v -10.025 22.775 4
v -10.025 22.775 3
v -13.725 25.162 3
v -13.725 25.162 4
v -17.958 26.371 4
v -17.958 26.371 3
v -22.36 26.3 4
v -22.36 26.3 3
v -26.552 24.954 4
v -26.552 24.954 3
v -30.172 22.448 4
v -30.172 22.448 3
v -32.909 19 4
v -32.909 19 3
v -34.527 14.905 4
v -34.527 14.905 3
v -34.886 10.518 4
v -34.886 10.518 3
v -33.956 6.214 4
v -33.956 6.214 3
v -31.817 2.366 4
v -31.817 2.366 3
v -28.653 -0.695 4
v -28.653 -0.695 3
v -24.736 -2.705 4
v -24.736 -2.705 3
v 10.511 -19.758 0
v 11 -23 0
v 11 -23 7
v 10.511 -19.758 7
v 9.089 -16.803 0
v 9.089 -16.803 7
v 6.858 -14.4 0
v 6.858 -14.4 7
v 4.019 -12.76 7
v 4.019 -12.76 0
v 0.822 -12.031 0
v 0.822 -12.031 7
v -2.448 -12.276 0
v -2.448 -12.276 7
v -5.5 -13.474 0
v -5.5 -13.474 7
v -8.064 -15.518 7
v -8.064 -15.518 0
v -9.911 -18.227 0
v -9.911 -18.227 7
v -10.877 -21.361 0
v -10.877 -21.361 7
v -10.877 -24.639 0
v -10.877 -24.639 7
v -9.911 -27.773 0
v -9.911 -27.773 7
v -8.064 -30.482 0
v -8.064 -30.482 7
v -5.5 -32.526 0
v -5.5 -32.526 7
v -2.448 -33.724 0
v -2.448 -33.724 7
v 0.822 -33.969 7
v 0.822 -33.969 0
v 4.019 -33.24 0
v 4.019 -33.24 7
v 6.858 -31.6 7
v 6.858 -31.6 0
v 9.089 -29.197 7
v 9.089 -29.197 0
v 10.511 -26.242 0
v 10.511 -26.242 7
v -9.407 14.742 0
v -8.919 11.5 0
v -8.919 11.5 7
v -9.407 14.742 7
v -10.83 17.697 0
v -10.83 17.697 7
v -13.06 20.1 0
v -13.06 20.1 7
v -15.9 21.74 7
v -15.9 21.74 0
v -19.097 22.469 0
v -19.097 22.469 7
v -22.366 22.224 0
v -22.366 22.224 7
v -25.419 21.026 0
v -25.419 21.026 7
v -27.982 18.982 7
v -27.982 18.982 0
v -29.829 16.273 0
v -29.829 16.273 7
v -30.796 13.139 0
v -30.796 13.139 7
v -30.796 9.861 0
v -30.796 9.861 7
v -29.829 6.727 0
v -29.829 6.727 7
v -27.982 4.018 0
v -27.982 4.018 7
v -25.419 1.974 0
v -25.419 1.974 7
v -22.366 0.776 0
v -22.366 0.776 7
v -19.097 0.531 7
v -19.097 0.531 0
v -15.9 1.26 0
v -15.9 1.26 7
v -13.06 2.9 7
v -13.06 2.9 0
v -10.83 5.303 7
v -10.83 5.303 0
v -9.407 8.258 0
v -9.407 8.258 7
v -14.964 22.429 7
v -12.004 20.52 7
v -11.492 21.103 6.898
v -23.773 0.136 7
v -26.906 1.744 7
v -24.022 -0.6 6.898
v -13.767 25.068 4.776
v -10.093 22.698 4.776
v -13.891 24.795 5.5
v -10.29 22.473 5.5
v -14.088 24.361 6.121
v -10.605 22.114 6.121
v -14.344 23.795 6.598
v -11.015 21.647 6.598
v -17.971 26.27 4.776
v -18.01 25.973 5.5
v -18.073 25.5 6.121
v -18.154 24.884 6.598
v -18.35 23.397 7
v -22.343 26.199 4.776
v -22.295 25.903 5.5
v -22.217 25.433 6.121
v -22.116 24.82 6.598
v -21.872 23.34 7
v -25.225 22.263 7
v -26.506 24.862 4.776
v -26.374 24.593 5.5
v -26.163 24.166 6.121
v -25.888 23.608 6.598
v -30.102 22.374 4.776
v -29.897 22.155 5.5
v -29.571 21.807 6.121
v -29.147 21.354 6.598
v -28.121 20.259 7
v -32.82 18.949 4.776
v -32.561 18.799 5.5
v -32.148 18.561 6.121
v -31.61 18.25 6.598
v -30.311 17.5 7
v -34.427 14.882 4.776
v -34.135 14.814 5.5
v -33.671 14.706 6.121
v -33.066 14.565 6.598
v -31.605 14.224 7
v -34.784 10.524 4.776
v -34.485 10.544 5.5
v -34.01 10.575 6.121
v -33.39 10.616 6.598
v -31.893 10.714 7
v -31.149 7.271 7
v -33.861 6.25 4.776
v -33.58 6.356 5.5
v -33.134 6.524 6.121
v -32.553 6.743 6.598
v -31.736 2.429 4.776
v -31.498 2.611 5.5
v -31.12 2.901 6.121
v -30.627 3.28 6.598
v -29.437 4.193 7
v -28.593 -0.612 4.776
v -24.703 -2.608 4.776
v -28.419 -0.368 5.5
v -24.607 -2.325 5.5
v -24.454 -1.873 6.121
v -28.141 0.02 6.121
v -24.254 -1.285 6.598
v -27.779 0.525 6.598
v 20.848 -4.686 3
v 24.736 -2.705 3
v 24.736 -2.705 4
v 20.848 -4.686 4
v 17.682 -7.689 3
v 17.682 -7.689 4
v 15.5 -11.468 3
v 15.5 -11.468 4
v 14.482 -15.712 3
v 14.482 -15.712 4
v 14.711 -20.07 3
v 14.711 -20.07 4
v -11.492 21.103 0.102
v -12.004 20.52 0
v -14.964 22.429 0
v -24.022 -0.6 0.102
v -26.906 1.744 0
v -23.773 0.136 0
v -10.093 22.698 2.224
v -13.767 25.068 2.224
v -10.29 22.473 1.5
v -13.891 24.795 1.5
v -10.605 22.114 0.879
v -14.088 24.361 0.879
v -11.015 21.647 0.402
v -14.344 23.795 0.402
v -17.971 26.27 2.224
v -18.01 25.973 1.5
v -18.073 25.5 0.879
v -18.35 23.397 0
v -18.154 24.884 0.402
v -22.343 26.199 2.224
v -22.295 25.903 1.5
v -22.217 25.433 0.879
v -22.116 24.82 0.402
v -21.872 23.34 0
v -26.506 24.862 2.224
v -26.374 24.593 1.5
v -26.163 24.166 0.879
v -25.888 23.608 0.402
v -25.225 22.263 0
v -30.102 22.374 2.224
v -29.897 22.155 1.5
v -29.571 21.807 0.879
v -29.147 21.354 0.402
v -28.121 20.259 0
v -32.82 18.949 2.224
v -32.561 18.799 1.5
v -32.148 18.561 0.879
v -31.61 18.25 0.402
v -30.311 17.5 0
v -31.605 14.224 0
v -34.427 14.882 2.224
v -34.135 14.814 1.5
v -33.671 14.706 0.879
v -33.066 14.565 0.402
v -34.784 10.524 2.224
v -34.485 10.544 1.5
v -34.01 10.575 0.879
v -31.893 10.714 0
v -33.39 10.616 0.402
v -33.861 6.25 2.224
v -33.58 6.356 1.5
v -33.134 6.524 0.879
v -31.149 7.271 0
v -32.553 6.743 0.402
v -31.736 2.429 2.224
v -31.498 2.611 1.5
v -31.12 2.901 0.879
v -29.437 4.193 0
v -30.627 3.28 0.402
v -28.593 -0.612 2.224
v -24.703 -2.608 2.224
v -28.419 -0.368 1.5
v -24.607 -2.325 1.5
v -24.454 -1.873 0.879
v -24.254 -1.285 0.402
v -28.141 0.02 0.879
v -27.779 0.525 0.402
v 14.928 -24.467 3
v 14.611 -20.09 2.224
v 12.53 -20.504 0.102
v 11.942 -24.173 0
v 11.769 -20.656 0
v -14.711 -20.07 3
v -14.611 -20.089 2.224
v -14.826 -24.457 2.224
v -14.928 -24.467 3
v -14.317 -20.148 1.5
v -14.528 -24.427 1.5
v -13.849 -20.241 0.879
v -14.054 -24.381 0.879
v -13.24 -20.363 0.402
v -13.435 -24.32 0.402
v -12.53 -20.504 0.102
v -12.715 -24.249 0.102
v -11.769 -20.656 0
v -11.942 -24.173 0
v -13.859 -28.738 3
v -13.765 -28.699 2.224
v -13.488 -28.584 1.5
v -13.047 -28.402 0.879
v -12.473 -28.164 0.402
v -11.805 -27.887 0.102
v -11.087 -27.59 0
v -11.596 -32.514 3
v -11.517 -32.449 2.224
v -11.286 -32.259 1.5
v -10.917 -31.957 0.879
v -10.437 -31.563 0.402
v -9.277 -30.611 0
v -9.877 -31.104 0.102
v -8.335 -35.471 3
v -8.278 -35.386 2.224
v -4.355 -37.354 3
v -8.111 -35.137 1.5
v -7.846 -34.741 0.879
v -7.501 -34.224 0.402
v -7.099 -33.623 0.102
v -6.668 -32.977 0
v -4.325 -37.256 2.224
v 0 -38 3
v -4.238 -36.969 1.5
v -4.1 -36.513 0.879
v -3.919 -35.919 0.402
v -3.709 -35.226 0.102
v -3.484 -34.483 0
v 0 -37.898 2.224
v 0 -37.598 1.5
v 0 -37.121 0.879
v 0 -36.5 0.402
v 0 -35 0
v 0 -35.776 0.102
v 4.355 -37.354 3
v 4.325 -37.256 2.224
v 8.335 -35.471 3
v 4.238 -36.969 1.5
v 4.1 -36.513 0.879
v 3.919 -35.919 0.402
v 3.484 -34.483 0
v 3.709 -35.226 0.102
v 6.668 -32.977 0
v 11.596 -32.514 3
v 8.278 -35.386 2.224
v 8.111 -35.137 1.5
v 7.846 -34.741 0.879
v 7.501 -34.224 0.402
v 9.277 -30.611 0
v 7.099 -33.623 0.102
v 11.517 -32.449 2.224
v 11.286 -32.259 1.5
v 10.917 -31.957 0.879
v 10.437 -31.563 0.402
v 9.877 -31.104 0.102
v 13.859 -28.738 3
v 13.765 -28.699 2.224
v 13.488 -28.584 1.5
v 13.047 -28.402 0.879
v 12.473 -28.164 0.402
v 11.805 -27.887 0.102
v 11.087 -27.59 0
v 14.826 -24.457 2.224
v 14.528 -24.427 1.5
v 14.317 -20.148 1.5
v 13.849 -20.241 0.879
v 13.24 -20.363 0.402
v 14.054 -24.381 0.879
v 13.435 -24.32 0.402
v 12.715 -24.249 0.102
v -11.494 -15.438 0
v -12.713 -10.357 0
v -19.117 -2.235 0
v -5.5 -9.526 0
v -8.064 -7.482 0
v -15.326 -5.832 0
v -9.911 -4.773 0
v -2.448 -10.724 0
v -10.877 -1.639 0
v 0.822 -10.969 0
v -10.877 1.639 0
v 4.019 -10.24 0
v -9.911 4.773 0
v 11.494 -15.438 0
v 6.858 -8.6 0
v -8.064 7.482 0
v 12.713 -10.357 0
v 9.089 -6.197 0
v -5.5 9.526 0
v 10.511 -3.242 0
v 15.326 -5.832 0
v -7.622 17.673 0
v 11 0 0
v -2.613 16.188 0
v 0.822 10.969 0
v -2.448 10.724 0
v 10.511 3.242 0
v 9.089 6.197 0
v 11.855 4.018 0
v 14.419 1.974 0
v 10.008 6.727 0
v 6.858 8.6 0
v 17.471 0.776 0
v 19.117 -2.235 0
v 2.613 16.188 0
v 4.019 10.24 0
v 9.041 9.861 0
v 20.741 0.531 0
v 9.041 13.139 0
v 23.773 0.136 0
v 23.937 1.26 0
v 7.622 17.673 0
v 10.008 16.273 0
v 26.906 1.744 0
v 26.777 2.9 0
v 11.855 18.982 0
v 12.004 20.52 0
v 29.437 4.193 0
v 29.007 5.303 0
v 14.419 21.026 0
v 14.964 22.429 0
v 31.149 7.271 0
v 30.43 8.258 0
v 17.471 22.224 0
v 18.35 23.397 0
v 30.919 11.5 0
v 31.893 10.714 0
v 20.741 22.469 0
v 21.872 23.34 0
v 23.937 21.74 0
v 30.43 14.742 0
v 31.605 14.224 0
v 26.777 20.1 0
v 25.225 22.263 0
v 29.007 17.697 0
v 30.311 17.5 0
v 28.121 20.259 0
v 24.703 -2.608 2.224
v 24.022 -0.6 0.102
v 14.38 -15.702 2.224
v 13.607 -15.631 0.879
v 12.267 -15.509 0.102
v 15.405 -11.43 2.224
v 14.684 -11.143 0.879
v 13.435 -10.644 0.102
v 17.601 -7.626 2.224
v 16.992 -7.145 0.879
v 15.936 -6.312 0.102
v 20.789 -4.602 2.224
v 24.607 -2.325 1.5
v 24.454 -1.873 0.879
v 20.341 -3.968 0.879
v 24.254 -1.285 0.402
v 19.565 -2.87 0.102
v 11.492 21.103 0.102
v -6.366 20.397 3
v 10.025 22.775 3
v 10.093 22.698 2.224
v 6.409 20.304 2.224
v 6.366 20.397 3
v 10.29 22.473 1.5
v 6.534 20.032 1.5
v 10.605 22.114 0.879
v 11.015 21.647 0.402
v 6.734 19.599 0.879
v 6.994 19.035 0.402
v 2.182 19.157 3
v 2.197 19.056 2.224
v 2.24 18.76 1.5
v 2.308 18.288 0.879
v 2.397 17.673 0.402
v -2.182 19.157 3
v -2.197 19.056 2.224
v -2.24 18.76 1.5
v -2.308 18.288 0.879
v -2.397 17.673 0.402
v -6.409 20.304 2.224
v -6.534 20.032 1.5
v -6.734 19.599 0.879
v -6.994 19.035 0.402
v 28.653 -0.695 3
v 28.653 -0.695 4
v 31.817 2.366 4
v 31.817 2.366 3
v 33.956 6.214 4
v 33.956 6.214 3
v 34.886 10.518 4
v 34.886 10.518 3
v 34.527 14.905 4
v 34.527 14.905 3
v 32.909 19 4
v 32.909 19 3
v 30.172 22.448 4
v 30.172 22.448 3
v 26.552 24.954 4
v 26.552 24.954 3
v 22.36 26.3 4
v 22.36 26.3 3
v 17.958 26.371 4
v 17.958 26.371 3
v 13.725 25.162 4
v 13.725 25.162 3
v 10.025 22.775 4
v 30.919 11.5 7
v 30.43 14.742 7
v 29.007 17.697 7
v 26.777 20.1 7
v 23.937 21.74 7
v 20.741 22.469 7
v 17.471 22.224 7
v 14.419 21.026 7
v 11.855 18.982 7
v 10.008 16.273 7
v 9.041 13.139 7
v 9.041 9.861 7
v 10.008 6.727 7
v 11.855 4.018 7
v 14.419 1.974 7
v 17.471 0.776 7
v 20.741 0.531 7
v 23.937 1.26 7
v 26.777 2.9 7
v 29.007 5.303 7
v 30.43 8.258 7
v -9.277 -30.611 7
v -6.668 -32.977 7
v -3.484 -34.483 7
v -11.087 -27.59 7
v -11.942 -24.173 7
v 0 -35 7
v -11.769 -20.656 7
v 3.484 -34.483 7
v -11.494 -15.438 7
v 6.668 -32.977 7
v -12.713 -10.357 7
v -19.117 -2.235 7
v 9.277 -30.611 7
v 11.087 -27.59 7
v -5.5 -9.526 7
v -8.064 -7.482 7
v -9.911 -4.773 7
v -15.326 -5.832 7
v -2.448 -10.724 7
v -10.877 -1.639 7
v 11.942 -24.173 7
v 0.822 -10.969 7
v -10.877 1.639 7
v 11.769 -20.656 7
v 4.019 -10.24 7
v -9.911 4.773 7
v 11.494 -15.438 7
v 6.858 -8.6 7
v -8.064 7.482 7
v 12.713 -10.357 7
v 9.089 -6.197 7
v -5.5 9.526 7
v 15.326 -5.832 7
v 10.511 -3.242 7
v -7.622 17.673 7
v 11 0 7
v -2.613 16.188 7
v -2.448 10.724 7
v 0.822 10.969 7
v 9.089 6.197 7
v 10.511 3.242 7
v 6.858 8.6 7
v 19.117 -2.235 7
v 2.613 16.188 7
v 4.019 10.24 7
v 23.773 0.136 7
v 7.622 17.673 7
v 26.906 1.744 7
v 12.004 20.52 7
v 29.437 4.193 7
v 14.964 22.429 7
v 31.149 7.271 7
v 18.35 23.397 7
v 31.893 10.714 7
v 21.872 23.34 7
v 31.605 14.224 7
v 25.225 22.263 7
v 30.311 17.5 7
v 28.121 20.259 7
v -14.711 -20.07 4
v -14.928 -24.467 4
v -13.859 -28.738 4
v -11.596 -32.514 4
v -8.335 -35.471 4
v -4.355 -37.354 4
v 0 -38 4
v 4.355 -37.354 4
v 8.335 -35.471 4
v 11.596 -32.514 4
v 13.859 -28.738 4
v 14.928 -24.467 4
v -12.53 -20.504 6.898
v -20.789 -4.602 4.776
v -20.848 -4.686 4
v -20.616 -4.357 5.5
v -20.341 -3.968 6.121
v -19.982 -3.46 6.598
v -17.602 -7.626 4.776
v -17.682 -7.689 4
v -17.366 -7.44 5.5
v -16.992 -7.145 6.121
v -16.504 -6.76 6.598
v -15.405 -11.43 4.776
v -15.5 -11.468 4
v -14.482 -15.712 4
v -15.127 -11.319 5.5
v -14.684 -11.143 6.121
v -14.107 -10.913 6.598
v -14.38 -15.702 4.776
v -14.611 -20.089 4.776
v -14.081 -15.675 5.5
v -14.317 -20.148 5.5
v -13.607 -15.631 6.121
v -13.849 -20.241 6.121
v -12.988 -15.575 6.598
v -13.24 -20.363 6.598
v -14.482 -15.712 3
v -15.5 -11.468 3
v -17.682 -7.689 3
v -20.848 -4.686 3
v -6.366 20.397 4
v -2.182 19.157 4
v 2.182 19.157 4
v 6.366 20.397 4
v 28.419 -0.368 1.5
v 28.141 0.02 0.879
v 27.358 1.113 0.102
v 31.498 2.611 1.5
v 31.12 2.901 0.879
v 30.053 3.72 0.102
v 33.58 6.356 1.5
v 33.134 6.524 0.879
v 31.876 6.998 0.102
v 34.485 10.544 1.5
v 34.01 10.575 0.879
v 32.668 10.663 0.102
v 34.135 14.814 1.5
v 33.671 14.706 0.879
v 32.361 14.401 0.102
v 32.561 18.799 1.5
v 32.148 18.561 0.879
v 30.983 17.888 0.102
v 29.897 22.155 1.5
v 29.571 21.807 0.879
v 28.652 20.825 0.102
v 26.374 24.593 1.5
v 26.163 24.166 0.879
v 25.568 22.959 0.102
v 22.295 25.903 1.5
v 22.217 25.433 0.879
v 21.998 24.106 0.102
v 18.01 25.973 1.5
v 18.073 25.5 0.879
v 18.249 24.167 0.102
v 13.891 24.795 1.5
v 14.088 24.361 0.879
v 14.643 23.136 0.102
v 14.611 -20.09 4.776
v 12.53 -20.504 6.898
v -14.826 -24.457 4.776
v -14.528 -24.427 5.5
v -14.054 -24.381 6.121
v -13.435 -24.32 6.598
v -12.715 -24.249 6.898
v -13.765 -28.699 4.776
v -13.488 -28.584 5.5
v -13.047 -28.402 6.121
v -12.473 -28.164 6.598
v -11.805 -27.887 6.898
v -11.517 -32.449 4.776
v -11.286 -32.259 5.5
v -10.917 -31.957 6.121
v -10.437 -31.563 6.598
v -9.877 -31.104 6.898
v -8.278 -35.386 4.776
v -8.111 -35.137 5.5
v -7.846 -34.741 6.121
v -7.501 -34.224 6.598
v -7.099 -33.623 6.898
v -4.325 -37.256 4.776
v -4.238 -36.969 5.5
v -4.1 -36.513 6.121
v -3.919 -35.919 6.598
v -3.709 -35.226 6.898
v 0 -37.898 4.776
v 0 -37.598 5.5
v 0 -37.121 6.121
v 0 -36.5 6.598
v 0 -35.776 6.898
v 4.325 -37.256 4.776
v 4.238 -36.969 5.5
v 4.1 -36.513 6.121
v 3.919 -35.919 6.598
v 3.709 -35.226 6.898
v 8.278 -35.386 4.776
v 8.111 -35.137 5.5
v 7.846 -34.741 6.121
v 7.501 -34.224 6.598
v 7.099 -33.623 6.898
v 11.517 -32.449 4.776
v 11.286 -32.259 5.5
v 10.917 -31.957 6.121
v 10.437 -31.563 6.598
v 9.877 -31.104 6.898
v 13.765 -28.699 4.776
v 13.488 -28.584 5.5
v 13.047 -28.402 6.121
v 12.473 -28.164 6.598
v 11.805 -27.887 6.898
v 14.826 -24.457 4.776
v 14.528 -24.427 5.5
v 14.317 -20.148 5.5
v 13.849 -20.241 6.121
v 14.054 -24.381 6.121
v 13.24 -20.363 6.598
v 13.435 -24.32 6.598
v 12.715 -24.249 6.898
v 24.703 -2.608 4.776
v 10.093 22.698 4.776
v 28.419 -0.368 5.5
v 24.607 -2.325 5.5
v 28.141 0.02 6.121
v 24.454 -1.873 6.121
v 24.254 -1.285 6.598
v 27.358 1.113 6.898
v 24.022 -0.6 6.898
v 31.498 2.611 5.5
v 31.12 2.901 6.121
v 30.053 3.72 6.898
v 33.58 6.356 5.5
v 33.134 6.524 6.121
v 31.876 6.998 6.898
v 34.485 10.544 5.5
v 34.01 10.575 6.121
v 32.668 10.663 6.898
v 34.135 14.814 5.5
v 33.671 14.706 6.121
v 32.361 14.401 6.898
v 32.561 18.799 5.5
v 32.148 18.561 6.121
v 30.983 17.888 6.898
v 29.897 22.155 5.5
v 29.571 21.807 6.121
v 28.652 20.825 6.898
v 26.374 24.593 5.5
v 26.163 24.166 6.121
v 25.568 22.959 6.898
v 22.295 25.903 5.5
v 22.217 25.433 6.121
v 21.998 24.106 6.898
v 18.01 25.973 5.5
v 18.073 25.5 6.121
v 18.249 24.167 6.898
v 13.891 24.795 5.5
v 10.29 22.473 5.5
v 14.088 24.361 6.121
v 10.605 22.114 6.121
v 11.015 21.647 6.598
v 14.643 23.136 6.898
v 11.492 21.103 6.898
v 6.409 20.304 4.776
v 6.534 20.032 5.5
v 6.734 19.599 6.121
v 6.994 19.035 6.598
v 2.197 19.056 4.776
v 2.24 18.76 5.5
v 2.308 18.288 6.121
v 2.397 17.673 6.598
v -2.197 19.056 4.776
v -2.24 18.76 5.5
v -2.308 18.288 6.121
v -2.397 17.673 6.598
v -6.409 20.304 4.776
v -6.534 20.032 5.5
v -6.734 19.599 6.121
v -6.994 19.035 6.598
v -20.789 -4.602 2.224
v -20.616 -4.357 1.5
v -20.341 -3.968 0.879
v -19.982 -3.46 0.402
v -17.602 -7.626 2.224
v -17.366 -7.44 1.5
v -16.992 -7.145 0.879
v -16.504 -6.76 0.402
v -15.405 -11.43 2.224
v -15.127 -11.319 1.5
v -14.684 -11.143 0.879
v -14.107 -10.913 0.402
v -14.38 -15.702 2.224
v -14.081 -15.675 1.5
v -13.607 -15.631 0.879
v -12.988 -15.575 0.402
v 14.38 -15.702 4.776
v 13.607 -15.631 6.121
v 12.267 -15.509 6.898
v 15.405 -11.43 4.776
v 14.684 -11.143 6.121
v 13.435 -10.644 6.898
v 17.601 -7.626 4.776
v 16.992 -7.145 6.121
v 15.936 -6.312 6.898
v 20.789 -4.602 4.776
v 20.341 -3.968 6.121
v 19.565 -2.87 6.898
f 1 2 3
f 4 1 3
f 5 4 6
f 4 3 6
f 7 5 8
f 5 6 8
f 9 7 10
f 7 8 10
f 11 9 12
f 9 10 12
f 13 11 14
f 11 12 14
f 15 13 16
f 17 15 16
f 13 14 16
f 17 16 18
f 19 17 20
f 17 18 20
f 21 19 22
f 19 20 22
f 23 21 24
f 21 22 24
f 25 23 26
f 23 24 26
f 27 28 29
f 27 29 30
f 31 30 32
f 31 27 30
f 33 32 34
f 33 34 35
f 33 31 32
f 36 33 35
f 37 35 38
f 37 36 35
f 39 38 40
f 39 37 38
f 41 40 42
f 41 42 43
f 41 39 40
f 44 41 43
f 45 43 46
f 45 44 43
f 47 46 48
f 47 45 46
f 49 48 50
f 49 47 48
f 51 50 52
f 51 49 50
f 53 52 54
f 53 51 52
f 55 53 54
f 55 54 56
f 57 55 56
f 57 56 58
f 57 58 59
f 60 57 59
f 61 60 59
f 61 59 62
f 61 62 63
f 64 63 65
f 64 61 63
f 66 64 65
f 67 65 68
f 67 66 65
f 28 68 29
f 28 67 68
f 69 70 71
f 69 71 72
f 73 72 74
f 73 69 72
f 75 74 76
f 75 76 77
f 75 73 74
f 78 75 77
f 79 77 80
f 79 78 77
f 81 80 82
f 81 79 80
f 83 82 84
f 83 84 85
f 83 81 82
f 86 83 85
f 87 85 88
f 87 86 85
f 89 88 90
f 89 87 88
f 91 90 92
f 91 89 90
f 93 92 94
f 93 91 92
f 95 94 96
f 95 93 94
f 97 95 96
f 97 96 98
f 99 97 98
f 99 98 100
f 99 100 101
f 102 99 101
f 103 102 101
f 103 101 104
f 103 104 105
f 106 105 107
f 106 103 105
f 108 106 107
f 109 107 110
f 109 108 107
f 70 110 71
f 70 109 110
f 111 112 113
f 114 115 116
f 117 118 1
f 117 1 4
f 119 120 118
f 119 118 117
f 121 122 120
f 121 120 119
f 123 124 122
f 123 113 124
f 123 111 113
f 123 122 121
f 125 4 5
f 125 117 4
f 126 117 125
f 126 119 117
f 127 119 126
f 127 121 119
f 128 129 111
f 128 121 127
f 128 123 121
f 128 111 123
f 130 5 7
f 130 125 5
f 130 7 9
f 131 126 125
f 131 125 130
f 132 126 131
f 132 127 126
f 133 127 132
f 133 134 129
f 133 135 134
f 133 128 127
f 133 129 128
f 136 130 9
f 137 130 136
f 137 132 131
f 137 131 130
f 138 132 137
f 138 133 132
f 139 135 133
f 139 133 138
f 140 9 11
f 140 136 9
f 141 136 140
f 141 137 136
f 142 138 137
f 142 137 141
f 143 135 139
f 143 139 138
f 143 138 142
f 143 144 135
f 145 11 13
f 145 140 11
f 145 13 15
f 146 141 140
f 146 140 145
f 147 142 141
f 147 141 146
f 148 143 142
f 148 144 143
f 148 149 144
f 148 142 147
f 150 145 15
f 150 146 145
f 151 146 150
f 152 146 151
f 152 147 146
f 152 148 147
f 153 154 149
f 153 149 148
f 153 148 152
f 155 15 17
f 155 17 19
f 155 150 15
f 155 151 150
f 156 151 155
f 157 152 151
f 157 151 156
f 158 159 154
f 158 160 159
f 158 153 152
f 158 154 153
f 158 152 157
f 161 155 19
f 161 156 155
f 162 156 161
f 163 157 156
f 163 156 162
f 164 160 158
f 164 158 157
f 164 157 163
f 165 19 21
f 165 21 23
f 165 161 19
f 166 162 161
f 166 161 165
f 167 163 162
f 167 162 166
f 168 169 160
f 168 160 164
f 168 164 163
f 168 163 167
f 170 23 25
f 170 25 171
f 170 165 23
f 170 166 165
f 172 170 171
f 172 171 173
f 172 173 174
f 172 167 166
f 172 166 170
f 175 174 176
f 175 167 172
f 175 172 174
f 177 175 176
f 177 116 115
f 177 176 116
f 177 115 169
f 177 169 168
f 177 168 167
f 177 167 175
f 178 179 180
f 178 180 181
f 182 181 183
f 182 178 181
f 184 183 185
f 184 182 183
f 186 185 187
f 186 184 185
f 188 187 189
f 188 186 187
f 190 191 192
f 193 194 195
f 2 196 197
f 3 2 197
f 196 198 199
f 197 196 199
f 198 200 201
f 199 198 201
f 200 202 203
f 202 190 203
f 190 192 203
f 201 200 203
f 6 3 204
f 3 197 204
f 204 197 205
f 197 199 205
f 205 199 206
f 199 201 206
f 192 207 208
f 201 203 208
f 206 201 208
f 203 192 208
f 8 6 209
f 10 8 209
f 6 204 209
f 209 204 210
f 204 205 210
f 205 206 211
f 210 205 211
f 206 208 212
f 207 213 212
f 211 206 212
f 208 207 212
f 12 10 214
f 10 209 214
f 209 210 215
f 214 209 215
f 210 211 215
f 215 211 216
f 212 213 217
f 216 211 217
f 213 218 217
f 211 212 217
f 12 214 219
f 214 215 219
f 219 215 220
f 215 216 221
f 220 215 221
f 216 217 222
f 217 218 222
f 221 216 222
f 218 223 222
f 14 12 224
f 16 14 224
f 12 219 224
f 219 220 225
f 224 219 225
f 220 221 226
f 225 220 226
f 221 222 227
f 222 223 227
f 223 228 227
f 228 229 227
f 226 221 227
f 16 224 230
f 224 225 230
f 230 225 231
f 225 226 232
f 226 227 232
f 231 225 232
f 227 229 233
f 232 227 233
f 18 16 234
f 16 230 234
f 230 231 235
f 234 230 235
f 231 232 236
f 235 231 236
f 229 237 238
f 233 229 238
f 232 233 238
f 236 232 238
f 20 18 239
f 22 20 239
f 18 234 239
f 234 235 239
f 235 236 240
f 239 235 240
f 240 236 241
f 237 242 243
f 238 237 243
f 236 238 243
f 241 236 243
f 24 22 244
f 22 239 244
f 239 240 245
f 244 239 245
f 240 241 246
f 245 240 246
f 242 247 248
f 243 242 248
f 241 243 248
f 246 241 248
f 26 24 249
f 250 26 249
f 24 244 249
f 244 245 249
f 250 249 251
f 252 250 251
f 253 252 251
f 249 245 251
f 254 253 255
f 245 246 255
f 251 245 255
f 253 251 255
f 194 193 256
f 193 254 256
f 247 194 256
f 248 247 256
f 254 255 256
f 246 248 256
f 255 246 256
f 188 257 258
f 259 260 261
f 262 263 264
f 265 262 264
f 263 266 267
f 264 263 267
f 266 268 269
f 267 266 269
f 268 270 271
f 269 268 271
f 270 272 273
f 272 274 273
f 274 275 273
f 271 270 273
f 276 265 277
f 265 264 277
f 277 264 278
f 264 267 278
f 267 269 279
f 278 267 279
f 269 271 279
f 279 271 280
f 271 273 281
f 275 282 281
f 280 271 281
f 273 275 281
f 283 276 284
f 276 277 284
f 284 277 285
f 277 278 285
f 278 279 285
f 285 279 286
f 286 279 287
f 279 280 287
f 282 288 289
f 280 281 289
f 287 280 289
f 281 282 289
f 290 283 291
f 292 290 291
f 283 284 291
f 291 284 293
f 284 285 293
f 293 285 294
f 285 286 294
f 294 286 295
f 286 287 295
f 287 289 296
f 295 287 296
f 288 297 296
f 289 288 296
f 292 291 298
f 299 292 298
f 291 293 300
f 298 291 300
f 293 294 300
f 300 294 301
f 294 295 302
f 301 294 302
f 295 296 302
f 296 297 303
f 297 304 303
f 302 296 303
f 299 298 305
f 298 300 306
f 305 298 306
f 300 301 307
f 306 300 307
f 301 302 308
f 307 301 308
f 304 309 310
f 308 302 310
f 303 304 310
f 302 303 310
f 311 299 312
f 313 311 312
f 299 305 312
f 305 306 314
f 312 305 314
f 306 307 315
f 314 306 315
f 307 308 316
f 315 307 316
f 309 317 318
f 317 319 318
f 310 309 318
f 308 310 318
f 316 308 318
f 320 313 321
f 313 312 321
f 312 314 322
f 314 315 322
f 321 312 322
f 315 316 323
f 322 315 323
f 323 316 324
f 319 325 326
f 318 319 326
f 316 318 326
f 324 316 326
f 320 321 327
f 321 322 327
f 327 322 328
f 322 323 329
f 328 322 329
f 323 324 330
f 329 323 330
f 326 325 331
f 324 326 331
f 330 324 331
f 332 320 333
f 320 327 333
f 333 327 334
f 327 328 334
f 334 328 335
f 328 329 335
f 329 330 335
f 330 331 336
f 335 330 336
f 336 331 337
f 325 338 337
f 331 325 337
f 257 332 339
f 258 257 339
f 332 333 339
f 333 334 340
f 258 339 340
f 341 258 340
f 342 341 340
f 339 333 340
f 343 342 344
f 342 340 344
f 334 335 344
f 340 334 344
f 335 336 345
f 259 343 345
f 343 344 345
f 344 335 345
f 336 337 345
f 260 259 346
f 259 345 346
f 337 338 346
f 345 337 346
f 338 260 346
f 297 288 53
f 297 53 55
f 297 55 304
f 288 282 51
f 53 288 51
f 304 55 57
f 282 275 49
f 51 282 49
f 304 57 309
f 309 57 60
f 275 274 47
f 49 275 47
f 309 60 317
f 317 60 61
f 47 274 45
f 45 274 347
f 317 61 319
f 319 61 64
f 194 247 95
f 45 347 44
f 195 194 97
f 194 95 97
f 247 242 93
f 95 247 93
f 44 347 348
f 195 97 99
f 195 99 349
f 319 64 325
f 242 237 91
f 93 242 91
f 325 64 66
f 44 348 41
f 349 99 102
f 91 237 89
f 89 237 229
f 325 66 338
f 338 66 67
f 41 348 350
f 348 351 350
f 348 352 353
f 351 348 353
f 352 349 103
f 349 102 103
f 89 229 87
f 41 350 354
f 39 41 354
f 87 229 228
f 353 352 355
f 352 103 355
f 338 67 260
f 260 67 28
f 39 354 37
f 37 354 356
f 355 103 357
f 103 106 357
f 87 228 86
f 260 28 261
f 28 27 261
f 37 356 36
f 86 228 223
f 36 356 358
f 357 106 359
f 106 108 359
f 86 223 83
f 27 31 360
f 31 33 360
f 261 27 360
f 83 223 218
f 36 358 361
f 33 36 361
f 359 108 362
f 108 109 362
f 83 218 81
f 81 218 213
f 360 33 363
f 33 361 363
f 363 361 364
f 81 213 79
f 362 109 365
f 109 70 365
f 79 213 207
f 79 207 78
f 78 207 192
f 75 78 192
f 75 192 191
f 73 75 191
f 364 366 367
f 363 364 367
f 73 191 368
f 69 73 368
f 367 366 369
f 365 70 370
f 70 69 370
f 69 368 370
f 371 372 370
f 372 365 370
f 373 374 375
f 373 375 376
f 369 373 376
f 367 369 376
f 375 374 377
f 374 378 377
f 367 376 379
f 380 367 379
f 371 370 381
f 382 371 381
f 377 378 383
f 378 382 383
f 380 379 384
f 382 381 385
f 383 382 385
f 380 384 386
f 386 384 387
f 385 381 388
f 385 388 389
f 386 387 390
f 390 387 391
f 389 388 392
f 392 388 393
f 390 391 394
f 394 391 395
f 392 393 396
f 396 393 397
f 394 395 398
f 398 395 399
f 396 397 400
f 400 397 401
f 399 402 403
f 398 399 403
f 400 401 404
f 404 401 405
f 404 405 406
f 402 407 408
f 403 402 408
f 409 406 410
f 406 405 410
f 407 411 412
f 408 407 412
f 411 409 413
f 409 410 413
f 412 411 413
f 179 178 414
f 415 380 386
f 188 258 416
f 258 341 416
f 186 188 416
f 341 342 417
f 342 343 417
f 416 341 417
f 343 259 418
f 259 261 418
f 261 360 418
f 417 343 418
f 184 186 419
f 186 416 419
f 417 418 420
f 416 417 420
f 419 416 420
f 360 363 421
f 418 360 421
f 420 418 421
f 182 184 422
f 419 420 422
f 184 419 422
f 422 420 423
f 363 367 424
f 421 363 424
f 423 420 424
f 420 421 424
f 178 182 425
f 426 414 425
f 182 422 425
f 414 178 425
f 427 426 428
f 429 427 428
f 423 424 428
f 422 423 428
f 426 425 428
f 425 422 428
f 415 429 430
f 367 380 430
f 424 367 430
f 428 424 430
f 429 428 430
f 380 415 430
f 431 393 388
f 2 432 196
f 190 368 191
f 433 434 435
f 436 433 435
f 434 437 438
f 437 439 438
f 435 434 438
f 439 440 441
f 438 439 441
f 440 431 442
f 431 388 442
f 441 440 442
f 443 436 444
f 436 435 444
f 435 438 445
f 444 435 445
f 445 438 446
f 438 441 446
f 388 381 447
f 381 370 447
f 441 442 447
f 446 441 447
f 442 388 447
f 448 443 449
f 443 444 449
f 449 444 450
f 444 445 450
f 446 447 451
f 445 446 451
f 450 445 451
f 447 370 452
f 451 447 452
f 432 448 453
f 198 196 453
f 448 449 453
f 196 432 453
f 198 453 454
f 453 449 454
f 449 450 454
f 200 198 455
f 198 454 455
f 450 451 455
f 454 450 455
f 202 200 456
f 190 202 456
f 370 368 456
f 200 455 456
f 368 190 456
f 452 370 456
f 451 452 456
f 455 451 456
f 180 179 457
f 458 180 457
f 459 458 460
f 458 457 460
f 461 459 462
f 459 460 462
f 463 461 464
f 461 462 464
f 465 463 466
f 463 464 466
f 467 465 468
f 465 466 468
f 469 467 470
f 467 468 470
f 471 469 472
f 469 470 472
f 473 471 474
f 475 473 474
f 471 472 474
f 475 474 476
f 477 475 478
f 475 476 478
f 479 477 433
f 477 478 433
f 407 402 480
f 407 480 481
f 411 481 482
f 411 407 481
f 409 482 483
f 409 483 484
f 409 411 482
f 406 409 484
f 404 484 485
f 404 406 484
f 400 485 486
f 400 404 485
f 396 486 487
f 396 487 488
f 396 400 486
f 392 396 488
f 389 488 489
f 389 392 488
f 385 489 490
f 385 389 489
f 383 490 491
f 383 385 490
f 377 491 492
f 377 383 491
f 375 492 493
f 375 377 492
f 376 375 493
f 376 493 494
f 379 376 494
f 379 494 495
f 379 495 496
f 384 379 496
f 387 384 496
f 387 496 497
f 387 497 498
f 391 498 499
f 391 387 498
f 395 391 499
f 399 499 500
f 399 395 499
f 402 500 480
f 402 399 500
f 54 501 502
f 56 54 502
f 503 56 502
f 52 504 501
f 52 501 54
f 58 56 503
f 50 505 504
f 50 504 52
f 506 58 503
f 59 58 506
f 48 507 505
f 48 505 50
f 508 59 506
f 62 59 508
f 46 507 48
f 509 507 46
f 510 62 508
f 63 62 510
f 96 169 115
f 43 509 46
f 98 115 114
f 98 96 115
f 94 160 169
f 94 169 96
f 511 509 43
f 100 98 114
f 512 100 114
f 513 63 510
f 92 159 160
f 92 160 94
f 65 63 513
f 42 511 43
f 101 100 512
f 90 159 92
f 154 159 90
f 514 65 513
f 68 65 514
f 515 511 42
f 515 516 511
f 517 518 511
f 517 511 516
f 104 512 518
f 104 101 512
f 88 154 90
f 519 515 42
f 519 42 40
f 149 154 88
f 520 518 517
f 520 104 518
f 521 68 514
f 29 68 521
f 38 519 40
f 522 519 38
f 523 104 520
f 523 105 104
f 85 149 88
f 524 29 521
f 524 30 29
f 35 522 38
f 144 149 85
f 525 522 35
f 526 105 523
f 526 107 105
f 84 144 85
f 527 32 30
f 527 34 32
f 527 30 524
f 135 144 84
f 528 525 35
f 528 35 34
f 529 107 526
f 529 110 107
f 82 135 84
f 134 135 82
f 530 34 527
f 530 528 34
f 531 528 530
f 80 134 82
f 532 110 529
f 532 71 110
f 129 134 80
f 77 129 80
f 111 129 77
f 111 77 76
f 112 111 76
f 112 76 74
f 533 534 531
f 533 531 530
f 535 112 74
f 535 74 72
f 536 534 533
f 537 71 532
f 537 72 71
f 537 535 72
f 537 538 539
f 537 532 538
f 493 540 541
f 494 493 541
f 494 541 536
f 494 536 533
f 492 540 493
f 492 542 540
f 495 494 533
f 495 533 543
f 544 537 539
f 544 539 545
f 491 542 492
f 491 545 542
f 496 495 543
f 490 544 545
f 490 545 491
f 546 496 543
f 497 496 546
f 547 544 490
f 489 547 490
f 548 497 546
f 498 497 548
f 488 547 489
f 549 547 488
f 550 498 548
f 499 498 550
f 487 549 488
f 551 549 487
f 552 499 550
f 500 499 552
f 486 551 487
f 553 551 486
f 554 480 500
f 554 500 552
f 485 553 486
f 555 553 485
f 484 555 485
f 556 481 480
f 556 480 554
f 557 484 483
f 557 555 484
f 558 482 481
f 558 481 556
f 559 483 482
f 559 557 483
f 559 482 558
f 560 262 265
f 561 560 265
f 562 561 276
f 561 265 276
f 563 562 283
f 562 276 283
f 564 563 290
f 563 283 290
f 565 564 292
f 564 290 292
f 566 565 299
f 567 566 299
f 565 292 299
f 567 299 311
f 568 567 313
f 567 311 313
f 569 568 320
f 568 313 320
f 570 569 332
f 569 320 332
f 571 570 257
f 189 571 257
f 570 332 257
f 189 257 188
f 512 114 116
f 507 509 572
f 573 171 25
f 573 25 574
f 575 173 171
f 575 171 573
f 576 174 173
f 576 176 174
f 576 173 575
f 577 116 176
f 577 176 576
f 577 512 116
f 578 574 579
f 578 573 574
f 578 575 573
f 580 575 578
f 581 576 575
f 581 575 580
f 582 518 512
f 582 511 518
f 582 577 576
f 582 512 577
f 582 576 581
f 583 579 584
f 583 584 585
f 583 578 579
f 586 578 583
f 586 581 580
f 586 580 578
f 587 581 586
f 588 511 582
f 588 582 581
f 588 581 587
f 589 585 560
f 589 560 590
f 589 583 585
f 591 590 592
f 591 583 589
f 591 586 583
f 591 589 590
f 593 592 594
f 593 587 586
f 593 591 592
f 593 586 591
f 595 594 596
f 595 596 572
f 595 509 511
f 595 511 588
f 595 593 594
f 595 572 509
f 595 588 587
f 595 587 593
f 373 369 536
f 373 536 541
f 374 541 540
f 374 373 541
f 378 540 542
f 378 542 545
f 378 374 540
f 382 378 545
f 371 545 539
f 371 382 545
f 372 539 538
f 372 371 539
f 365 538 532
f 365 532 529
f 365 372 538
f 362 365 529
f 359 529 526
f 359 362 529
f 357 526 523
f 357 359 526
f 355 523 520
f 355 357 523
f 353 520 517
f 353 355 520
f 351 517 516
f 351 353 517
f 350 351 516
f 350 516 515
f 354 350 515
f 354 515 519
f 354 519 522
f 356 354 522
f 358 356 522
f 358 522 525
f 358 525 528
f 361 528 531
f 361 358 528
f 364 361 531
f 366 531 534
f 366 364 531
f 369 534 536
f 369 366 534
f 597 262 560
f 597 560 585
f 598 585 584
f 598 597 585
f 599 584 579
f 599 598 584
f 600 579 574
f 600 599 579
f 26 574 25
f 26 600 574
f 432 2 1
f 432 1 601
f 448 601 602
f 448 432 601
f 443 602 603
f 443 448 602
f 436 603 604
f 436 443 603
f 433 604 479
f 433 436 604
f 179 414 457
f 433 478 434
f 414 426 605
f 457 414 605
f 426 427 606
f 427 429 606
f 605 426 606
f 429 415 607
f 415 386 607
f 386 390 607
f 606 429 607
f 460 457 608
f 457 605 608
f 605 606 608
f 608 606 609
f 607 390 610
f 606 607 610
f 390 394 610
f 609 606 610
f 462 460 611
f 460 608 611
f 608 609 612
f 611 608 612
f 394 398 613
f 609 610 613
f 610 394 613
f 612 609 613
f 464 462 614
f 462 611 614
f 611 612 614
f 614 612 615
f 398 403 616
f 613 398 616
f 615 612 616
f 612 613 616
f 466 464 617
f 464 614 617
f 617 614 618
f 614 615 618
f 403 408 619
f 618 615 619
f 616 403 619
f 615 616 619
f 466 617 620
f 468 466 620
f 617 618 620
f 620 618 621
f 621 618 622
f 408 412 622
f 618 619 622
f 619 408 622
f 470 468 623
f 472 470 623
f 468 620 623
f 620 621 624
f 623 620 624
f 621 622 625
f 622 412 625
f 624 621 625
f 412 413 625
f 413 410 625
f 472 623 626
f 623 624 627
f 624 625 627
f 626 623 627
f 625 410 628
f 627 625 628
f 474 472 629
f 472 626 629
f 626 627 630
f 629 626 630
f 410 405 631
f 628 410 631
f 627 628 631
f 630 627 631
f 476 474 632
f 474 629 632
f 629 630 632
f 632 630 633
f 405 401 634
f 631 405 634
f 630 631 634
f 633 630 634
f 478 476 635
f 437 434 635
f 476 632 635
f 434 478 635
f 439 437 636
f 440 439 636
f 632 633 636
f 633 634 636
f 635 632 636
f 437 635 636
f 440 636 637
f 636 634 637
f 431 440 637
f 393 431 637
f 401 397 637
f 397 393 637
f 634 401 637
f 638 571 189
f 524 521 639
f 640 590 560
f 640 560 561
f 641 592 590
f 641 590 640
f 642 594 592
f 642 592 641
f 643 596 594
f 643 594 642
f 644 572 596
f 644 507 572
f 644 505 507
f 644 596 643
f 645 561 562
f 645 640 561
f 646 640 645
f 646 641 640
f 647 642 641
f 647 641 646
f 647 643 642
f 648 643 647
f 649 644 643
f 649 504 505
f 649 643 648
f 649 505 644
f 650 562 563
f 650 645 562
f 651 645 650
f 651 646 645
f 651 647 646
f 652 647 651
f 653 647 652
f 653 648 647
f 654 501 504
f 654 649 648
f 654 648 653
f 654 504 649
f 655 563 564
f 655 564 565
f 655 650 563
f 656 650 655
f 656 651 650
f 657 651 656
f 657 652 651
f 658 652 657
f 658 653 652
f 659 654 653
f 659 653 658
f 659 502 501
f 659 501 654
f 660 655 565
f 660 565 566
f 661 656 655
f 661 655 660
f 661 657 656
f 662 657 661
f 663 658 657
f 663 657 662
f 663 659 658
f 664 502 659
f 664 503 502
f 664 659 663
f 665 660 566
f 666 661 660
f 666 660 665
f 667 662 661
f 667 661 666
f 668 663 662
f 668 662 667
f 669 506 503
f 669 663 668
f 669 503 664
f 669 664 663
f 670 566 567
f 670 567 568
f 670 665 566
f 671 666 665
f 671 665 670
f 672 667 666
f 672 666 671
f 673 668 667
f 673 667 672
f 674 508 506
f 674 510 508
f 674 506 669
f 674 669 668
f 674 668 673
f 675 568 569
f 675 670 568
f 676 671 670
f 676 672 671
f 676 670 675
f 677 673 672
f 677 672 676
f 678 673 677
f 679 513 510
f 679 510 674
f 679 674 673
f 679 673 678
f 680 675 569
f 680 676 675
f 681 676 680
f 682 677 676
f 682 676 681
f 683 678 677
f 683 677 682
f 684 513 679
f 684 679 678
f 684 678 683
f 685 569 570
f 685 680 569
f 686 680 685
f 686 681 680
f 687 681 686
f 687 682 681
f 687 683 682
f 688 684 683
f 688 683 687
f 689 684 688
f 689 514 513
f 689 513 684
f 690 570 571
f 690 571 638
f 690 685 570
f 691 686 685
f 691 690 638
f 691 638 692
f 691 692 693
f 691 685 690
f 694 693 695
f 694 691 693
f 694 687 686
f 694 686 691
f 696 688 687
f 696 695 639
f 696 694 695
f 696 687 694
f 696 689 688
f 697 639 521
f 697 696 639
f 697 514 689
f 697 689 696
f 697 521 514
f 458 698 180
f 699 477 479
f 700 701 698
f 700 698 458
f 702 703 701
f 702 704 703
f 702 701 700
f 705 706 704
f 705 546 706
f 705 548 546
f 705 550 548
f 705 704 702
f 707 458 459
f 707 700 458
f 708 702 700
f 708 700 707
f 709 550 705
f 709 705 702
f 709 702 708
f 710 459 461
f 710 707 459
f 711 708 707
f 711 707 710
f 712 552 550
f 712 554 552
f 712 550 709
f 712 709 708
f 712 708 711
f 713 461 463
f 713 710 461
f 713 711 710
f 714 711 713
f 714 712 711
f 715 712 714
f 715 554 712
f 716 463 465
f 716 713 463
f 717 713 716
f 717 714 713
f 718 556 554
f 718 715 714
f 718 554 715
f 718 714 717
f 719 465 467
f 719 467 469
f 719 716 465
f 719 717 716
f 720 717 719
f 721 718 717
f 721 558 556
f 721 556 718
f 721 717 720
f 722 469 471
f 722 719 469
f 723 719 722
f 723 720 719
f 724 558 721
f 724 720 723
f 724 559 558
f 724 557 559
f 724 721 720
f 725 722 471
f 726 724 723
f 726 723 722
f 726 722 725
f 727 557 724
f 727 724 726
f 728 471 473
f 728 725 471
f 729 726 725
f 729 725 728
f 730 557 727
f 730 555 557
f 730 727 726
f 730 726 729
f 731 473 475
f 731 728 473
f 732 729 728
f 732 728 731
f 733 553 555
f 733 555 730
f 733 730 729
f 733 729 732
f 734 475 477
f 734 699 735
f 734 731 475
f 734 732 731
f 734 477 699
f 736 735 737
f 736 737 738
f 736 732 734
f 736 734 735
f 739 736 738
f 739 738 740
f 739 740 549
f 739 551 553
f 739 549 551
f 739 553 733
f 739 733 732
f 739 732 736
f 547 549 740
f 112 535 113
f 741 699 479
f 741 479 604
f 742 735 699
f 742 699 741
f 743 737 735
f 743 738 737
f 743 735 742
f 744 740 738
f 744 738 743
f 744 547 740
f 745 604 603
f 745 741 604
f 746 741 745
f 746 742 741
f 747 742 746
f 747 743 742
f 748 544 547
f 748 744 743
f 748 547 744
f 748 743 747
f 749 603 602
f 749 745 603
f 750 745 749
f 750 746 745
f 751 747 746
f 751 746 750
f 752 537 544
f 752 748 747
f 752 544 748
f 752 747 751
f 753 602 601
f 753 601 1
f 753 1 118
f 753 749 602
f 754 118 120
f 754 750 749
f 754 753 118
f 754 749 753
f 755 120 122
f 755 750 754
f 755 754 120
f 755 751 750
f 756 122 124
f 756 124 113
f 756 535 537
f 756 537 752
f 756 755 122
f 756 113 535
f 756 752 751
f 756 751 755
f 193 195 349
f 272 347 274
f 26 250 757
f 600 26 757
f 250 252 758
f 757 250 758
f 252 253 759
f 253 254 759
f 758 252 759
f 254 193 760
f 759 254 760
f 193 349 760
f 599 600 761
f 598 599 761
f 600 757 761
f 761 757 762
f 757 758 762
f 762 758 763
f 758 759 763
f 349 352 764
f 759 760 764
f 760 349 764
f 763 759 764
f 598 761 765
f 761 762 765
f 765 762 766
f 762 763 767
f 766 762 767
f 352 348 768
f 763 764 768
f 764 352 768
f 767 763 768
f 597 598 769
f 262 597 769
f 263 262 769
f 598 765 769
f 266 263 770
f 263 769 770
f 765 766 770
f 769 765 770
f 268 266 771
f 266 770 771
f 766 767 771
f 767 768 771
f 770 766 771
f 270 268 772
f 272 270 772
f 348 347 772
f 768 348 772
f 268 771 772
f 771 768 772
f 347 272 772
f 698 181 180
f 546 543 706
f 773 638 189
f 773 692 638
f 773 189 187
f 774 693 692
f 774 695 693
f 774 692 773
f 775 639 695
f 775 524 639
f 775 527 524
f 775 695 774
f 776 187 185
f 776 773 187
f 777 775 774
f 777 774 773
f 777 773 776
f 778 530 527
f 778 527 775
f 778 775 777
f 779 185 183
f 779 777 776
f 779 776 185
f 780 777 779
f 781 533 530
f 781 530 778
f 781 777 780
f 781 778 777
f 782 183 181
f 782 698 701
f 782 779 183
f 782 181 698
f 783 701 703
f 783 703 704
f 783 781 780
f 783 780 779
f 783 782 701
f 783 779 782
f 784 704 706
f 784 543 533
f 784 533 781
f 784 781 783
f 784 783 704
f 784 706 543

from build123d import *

# Parameters (mm, degrees)
SKETCH_R  = 11
PAD_DEPTH = 7
FILLET_R  = 3


with BuildPart() as part:
    # Sketch → Pad (new body)
    with BuildSketch(Plane.XY):
        with BuildLine():
            ThreePointArc((24.736194, -2.705303), (32.908969, 18.999993), (10.025247, 22.774834))
            ThreePointArc((-10.025222, 22.774812), (1.7e-05, 19), (10.025247, 22.774834))
            ThreePointArc((-10.025222, 22.774812), (-32.908957, 19.000015), (-24.736208, -2.705298))
            ThreePointArc((-14.71096, -20.069529), (-16.454484, -9.499997), (-24.736208, -2.705298))
            ThreePointArc((-14.71096, -20.069529), (-4e-06, -38), (14.710962, -20.069538))
            ThreePointArc((24.736194, -2.705303), (16.454478, -9.500007), (14.710962, -20.069538))
        make_face()
        with Locations((-19.918584, 11.5)):
            Circle(SKETCH_R, mode=Mode.SUBTRACT)
        Circle(SKETCH_R, mode=Mode.SUBTRACT)
        with Locations((19.918584, 11.5)):
            Circle(SKETCH_R, mode=Mode.SUBTRACT)
        with Locations((0, -23)):
            Circle(SKETCH_R, mode=Mode.SUBTRACT)
    extrude(amount=PAD_DEPTH)

    # Fillet
    fillet_edges = [part.edges().sort_by_distance(p)[0] for p in [
        (32.908969, 18.999993, 0),
        (32.908969, 18.999993, 7),
    ]]
    fillet(fillet_edges, radius=FILLET_R)


solid = part.part
